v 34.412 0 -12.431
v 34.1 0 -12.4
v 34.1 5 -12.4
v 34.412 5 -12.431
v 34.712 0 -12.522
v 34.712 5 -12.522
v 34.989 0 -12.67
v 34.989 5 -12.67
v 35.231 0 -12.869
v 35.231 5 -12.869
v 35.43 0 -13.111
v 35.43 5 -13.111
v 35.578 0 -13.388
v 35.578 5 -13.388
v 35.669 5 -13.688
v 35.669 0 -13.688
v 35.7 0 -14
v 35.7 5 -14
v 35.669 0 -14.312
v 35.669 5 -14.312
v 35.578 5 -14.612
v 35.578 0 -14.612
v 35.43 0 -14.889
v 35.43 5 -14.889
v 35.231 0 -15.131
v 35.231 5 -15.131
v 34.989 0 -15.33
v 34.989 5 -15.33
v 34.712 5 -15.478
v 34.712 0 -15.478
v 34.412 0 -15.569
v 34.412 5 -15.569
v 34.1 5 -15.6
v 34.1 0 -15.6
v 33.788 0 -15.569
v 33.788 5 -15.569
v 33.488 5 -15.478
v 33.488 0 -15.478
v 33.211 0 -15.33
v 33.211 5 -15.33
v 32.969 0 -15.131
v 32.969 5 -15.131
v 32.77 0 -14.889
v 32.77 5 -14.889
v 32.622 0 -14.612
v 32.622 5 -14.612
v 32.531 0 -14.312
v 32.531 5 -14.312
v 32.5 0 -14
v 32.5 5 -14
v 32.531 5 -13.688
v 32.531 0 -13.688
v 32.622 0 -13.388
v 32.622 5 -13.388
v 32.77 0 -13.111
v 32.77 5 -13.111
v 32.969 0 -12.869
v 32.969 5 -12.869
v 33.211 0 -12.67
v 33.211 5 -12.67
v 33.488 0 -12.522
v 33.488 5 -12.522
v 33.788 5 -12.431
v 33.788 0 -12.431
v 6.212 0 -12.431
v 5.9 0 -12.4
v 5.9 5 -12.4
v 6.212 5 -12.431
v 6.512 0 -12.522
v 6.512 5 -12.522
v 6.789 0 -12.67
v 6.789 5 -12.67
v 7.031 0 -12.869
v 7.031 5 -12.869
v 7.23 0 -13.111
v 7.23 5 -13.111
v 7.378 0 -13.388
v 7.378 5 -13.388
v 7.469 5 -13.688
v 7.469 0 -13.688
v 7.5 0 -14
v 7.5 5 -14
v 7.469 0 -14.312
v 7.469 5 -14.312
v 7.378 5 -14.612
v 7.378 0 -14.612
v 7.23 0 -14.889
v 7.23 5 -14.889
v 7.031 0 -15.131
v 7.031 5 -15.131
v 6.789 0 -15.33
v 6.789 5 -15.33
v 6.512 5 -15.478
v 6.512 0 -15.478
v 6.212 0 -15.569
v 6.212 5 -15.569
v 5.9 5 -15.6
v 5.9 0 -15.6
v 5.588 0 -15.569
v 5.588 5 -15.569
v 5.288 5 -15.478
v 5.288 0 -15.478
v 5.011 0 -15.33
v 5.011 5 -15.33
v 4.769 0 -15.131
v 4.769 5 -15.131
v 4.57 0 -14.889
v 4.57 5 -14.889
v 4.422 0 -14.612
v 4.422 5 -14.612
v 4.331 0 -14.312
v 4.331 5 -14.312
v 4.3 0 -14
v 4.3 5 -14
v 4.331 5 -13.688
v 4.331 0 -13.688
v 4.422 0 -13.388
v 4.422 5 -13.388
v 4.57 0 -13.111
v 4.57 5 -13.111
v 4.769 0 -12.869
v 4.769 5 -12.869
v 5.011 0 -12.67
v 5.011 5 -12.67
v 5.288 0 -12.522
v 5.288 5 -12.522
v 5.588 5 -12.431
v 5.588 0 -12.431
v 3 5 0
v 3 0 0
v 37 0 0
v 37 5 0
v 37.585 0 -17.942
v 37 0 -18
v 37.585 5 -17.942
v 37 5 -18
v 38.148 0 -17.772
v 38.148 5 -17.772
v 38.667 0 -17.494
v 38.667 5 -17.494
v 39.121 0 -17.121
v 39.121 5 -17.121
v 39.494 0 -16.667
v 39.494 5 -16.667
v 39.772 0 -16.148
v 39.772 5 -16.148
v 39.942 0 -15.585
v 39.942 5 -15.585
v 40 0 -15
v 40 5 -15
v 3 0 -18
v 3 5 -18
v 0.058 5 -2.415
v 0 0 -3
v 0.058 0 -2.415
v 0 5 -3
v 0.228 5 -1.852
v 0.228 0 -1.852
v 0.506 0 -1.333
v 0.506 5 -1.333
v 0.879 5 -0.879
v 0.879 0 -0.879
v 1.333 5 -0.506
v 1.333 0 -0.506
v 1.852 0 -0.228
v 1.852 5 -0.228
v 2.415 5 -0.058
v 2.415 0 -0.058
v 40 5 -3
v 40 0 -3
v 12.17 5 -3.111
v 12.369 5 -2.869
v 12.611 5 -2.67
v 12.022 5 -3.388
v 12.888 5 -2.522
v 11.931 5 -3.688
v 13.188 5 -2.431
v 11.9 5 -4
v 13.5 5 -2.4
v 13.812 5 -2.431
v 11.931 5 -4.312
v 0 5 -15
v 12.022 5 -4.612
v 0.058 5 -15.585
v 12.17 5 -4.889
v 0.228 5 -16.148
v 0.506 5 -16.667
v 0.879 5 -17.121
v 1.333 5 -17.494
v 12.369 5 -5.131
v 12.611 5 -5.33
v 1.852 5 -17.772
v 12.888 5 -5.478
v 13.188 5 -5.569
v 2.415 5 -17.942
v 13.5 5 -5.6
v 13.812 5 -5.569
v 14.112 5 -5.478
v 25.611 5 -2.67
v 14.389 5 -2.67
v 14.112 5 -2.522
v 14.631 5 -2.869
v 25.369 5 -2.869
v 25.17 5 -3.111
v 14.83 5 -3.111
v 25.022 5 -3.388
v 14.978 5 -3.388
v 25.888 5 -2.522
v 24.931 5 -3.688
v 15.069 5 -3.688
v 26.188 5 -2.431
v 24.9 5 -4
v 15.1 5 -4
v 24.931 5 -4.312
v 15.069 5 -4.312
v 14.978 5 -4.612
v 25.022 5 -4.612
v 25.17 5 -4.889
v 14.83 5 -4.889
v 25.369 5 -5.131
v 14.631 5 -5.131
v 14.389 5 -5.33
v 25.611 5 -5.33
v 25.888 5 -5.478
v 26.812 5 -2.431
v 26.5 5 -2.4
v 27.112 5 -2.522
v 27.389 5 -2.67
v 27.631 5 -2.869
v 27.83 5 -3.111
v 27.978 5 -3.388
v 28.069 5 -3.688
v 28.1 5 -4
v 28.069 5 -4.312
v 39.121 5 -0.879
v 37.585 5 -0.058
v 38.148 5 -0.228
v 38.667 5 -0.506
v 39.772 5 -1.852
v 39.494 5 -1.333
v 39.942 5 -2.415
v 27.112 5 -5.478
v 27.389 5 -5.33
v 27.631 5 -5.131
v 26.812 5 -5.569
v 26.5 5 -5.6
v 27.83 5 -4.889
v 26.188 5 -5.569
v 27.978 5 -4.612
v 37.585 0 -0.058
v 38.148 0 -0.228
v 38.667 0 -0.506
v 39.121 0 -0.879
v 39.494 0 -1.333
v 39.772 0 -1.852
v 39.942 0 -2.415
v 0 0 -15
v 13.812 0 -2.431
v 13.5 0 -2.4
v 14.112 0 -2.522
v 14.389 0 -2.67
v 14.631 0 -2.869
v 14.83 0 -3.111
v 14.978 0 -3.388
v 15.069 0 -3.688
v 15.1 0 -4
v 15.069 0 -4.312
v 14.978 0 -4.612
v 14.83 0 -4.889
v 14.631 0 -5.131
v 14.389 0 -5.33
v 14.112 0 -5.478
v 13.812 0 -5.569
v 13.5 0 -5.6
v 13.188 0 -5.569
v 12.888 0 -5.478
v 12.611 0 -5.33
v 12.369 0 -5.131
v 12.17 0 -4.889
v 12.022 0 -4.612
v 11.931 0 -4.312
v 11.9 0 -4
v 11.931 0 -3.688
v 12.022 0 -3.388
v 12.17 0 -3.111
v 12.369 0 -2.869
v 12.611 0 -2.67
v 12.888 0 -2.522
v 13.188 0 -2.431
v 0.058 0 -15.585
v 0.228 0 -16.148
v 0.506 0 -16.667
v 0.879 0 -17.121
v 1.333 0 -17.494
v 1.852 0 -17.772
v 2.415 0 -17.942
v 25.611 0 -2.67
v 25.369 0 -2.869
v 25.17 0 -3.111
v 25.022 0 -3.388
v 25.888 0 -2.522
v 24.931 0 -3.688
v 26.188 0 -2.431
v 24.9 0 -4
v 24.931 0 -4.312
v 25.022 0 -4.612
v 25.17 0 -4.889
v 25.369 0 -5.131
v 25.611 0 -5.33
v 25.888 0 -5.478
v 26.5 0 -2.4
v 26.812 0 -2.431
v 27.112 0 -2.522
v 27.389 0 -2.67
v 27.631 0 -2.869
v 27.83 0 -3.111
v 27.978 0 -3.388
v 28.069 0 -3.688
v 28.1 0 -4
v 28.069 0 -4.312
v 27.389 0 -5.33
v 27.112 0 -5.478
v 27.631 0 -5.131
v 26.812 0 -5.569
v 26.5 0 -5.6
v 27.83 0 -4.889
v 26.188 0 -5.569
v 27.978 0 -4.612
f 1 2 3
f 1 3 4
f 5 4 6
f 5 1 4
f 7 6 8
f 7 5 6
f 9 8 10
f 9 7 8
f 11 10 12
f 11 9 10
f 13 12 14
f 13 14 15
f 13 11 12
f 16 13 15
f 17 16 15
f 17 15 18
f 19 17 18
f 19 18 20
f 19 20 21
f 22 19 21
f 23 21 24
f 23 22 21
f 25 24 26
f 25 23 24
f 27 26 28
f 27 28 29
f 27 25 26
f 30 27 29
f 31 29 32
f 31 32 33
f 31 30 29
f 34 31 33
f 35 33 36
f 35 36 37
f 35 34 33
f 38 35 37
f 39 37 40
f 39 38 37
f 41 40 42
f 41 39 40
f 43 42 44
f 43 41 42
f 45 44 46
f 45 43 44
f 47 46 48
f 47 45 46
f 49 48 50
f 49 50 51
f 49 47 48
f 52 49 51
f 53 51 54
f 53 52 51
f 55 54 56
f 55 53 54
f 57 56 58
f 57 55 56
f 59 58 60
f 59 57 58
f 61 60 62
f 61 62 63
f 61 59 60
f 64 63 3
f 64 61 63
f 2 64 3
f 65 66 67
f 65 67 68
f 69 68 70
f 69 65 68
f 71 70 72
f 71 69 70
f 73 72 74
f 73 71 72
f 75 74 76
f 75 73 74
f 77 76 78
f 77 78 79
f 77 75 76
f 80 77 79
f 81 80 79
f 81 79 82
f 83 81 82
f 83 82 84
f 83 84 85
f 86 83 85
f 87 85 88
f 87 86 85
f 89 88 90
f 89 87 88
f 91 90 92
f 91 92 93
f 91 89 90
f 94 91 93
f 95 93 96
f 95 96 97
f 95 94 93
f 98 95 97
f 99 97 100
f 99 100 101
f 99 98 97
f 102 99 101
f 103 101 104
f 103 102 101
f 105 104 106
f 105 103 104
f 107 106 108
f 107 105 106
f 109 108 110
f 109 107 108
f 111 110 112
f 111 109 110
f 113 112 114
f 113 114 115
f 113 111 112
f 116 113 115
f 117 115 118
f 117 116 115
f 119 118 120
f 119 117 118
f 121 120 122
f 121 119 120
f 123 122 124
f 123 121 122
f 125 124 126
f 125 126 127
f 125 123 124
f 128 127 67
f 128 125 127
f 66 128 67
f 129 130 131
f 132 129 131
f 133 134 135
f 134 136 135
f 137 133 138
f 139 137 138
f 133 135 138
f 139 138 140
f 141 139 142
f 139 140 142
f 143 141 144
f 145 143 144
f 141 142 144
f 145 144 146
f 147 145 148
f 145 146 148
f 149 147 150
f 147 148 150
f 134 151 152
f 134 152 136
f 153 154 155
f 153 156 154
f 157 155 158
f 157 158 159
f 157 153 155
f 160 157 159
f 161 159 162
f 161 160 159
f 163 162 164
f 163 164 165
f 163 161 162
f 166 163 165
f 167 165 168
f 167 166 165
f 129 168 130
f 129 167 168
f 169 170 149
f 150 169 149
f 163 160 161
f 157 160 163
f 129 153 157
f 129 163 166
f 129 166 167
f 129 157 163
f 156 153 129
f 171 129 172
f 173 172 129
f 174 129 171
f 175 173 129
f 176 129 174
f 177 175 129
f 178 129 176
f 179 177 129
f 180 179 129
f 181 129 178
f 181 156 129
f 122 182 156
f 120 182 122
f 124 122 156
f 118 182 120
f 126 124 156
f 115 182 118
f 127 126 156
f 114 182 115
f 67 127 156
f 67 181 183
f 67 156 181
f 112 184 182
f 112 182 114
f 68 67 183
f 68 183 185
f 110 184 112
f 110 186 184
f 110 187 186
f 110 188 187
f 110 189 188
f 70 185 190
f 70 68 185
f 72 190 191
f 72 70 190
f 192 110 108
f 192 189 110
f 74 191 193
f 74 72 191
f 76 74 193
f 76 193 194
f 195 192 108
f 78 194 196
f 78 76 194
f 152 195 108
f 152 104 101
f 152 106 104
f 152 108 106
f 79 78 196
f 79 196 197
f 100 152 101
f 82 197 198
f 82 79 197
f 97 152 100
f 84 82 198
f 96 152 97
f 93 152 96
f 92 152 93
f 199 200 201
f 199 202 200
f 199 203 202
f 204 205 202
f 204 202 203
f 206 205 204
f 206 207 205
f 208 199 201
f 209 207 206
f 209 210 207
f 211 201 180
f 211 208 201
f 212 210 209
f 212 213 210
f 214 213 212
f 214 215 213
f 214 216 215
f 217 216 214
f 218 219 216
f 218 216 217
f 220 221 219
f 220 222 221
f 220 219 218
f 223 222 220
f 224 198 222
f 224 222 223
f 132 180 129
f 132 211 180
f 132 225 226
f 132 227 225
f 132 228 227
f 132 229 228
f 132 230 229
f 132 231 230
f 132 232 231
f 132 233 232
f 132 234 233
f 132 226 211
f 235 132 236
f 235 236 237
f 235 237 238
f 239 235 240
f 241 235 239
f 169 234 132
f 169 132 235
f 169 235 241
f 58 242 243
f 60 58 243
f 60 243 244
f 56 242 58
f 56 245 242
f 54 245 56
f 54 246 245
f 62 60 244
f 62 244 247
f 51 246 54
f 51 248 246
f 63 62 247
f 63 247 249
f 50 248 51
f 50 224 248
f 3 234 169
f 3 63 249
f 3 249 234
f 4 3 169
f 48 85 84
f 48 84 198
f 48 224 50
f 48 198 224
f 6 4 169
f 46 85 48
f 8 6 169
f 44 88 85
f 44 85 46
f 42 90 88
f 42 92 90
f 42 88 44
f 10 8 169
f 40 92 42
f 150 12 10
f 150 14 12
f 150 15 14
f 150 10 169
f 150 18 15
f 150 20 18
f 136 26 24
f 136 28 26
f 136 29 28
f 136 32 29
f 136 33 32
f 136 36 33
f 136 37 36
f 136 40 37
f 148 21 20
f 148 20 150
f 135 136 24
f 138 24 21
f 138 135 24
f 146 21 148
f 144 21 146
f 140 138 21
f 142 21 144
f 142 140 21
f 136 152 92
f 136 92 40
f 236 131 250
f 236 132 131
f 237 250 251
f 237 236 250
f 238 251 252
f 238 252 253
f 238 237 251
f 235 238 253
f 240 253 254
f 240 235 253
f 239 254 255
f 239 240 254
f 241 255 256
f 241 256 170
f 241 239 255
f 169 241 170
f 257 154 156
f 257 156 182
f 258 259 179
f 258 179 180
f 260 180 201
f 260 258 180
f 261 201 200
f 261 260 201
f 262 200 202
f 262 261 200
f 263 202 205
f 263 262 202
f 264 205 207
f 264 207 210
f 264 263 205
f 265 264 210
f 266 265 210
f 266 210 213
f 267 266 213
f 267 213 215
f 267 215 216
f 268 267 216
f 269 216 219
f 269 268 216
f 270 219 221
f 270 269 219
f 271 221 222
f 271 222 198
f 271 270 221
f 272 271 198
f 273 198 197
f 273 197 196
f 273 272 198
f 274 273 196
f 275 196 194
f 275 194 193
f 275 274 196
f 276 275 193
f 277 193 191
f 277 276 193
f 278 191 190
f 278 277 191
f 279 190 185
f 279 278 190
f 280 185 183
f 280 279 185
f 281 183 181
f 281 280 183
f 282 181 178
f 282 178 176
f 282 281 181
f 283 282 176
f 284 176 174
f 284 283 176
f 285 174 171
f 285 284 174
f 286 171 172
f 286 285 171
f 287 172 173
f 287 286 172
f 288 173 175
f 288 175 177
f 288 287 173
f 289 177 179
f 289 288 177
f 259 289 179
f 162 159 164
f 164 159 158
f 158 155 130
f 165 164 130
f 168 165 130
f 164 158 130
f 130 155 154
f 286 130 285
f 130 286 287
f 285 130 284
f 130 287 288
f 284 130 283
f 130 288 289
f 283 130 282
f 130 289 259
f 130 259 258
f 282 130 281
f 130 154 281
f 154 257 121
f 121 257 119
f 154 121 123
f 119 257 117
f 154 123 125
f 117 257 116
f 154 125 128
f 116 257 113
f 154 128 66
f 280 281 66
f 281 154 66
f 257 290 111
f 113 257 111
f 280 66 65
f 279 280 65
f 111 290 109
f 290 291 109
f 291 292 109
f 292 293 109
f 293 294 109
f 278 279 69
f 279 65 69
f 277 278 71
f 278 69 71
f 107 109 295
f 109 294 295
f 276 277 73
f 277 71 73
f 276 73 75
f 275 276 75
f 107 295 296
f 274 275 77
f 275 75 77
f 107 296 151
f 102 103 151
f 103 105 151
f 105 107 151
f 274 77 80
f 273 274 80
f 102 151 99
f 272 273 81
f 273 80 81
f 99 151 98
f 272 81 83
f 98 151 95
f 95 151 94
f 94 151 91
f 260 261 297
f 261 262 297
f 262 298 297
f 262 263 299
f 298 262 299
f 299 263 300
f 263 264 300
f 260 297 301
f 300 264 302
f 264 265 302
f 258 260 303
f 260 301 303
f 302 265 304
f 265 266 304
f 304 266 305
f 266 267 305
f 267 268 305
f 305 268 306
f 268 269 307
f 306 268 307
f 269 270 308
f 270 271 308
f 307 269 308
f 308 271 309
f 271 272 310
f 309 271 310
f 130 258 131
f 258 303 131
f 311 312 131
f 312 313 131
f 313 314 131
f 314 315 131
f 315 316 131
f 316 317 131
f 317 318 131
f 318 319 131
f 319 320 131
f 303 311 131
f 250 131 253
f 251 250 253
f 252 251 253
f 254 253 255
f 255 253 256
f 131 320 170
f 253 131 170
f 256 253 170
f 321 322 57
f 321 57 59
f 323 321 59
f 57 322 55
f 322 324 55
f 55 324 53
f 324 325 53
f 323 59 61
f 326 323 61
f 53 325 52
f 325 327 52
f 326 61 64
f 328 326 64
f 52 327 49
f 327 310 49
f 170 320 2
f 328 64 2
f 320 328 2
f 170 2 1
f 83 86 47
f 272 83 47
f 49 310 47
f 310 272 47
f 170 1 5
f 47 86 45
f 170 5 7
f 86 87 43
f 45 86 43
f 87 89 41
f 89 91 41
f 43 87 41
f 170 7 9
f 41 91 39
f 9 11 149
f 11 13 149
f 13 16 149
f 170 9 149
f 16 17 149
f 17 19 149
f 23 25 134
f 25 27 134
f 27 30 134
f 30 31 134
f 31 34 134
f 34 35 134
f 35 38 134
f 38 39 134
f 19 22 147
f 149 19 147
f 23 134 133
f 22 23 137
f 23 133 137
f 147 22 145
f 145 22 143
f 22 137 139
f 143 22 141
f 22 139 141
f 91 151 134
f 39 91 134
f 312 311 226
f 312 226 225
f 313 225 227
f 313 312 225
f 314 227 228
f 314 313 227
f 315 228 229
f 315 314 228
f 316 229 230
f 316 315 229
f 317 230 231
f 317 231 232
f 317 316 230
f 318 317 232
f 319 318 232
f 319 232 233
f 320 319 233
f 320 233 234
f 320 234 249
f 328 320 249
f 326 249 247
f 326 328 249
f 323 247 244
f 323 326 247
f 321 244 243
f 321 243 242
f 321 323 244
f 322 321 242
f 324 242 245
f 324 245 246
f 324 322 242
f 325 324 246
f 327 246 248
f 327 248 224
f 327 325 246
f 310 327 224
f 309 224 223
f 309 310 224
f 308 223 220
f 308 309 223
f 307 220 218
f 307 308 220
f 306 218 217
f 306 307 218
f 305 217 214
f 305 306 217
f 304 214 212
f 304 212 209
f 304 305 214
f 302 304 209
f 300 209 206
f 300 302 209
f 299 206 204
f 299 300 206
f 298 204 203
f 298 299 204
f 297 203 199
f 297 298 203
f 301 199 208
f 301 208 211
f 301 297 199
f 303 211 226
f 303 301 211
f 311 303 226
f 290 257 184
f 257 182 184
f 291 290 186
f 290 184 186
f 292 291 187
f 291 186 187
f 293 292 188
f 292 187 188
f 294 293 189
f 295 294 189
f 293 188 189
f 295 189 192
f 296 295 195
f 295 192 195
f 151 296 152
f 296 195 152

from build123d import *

# Parameters (mm, degrees)
SKETCH2_W           = 40
SKETCH2_H           = 18
SKETCH2_R           = 1.6
BOSS_EXTRUDE1_DEPTH = 5
FILLET1_R           = 3


with BuildPart() as part:
    # Sketch2 → Boss-Extrude1 (new body)
    with BuildSketch(Plane(origin=(0, 0, 0), x_dir=(1, 0, 0), z_dir=(0, 1, 0))):
        with Locations((20, 9)):
            Rectangle(SKETCH2_W, SKETCH2_H)
        with Locations(Location((5.9, 14, 0), (0, 0, 270))):
            Circle(SKETCH2_R, mode=Mode.SUBTRACT)
        with Locations(Location((34.1, 14, 0), (0, 0, 270))):
            Circle(SKETCH2_R, mode=Mode.SUBTRACT)
        with Locations(Location((13.5, 4, 0), (0, 0, 270))):
            Circle(SKETCH2_R, mode=Mode.SUBTRACT)
        with Locations(Location((26.5, 4, 0), (0, 0, 270))):
            Circle(SKETCH2_R, mode=Mode.SUBTRACT)
    extrude(amount=BOSS_EXTRUDE1_DEPTH)

    # Fillet1
    fillet1_edges = [part.edges().sort_by_distance(p)[0] for p in [
        (0, 2.5, -18),
        (40, 2.5, -18),
        (40, 2.5, 0),
        (0, 2.5, 0),
    ]]
    fillet(fillet1_edges, radius=FILLET1_R)


solid = part.part
